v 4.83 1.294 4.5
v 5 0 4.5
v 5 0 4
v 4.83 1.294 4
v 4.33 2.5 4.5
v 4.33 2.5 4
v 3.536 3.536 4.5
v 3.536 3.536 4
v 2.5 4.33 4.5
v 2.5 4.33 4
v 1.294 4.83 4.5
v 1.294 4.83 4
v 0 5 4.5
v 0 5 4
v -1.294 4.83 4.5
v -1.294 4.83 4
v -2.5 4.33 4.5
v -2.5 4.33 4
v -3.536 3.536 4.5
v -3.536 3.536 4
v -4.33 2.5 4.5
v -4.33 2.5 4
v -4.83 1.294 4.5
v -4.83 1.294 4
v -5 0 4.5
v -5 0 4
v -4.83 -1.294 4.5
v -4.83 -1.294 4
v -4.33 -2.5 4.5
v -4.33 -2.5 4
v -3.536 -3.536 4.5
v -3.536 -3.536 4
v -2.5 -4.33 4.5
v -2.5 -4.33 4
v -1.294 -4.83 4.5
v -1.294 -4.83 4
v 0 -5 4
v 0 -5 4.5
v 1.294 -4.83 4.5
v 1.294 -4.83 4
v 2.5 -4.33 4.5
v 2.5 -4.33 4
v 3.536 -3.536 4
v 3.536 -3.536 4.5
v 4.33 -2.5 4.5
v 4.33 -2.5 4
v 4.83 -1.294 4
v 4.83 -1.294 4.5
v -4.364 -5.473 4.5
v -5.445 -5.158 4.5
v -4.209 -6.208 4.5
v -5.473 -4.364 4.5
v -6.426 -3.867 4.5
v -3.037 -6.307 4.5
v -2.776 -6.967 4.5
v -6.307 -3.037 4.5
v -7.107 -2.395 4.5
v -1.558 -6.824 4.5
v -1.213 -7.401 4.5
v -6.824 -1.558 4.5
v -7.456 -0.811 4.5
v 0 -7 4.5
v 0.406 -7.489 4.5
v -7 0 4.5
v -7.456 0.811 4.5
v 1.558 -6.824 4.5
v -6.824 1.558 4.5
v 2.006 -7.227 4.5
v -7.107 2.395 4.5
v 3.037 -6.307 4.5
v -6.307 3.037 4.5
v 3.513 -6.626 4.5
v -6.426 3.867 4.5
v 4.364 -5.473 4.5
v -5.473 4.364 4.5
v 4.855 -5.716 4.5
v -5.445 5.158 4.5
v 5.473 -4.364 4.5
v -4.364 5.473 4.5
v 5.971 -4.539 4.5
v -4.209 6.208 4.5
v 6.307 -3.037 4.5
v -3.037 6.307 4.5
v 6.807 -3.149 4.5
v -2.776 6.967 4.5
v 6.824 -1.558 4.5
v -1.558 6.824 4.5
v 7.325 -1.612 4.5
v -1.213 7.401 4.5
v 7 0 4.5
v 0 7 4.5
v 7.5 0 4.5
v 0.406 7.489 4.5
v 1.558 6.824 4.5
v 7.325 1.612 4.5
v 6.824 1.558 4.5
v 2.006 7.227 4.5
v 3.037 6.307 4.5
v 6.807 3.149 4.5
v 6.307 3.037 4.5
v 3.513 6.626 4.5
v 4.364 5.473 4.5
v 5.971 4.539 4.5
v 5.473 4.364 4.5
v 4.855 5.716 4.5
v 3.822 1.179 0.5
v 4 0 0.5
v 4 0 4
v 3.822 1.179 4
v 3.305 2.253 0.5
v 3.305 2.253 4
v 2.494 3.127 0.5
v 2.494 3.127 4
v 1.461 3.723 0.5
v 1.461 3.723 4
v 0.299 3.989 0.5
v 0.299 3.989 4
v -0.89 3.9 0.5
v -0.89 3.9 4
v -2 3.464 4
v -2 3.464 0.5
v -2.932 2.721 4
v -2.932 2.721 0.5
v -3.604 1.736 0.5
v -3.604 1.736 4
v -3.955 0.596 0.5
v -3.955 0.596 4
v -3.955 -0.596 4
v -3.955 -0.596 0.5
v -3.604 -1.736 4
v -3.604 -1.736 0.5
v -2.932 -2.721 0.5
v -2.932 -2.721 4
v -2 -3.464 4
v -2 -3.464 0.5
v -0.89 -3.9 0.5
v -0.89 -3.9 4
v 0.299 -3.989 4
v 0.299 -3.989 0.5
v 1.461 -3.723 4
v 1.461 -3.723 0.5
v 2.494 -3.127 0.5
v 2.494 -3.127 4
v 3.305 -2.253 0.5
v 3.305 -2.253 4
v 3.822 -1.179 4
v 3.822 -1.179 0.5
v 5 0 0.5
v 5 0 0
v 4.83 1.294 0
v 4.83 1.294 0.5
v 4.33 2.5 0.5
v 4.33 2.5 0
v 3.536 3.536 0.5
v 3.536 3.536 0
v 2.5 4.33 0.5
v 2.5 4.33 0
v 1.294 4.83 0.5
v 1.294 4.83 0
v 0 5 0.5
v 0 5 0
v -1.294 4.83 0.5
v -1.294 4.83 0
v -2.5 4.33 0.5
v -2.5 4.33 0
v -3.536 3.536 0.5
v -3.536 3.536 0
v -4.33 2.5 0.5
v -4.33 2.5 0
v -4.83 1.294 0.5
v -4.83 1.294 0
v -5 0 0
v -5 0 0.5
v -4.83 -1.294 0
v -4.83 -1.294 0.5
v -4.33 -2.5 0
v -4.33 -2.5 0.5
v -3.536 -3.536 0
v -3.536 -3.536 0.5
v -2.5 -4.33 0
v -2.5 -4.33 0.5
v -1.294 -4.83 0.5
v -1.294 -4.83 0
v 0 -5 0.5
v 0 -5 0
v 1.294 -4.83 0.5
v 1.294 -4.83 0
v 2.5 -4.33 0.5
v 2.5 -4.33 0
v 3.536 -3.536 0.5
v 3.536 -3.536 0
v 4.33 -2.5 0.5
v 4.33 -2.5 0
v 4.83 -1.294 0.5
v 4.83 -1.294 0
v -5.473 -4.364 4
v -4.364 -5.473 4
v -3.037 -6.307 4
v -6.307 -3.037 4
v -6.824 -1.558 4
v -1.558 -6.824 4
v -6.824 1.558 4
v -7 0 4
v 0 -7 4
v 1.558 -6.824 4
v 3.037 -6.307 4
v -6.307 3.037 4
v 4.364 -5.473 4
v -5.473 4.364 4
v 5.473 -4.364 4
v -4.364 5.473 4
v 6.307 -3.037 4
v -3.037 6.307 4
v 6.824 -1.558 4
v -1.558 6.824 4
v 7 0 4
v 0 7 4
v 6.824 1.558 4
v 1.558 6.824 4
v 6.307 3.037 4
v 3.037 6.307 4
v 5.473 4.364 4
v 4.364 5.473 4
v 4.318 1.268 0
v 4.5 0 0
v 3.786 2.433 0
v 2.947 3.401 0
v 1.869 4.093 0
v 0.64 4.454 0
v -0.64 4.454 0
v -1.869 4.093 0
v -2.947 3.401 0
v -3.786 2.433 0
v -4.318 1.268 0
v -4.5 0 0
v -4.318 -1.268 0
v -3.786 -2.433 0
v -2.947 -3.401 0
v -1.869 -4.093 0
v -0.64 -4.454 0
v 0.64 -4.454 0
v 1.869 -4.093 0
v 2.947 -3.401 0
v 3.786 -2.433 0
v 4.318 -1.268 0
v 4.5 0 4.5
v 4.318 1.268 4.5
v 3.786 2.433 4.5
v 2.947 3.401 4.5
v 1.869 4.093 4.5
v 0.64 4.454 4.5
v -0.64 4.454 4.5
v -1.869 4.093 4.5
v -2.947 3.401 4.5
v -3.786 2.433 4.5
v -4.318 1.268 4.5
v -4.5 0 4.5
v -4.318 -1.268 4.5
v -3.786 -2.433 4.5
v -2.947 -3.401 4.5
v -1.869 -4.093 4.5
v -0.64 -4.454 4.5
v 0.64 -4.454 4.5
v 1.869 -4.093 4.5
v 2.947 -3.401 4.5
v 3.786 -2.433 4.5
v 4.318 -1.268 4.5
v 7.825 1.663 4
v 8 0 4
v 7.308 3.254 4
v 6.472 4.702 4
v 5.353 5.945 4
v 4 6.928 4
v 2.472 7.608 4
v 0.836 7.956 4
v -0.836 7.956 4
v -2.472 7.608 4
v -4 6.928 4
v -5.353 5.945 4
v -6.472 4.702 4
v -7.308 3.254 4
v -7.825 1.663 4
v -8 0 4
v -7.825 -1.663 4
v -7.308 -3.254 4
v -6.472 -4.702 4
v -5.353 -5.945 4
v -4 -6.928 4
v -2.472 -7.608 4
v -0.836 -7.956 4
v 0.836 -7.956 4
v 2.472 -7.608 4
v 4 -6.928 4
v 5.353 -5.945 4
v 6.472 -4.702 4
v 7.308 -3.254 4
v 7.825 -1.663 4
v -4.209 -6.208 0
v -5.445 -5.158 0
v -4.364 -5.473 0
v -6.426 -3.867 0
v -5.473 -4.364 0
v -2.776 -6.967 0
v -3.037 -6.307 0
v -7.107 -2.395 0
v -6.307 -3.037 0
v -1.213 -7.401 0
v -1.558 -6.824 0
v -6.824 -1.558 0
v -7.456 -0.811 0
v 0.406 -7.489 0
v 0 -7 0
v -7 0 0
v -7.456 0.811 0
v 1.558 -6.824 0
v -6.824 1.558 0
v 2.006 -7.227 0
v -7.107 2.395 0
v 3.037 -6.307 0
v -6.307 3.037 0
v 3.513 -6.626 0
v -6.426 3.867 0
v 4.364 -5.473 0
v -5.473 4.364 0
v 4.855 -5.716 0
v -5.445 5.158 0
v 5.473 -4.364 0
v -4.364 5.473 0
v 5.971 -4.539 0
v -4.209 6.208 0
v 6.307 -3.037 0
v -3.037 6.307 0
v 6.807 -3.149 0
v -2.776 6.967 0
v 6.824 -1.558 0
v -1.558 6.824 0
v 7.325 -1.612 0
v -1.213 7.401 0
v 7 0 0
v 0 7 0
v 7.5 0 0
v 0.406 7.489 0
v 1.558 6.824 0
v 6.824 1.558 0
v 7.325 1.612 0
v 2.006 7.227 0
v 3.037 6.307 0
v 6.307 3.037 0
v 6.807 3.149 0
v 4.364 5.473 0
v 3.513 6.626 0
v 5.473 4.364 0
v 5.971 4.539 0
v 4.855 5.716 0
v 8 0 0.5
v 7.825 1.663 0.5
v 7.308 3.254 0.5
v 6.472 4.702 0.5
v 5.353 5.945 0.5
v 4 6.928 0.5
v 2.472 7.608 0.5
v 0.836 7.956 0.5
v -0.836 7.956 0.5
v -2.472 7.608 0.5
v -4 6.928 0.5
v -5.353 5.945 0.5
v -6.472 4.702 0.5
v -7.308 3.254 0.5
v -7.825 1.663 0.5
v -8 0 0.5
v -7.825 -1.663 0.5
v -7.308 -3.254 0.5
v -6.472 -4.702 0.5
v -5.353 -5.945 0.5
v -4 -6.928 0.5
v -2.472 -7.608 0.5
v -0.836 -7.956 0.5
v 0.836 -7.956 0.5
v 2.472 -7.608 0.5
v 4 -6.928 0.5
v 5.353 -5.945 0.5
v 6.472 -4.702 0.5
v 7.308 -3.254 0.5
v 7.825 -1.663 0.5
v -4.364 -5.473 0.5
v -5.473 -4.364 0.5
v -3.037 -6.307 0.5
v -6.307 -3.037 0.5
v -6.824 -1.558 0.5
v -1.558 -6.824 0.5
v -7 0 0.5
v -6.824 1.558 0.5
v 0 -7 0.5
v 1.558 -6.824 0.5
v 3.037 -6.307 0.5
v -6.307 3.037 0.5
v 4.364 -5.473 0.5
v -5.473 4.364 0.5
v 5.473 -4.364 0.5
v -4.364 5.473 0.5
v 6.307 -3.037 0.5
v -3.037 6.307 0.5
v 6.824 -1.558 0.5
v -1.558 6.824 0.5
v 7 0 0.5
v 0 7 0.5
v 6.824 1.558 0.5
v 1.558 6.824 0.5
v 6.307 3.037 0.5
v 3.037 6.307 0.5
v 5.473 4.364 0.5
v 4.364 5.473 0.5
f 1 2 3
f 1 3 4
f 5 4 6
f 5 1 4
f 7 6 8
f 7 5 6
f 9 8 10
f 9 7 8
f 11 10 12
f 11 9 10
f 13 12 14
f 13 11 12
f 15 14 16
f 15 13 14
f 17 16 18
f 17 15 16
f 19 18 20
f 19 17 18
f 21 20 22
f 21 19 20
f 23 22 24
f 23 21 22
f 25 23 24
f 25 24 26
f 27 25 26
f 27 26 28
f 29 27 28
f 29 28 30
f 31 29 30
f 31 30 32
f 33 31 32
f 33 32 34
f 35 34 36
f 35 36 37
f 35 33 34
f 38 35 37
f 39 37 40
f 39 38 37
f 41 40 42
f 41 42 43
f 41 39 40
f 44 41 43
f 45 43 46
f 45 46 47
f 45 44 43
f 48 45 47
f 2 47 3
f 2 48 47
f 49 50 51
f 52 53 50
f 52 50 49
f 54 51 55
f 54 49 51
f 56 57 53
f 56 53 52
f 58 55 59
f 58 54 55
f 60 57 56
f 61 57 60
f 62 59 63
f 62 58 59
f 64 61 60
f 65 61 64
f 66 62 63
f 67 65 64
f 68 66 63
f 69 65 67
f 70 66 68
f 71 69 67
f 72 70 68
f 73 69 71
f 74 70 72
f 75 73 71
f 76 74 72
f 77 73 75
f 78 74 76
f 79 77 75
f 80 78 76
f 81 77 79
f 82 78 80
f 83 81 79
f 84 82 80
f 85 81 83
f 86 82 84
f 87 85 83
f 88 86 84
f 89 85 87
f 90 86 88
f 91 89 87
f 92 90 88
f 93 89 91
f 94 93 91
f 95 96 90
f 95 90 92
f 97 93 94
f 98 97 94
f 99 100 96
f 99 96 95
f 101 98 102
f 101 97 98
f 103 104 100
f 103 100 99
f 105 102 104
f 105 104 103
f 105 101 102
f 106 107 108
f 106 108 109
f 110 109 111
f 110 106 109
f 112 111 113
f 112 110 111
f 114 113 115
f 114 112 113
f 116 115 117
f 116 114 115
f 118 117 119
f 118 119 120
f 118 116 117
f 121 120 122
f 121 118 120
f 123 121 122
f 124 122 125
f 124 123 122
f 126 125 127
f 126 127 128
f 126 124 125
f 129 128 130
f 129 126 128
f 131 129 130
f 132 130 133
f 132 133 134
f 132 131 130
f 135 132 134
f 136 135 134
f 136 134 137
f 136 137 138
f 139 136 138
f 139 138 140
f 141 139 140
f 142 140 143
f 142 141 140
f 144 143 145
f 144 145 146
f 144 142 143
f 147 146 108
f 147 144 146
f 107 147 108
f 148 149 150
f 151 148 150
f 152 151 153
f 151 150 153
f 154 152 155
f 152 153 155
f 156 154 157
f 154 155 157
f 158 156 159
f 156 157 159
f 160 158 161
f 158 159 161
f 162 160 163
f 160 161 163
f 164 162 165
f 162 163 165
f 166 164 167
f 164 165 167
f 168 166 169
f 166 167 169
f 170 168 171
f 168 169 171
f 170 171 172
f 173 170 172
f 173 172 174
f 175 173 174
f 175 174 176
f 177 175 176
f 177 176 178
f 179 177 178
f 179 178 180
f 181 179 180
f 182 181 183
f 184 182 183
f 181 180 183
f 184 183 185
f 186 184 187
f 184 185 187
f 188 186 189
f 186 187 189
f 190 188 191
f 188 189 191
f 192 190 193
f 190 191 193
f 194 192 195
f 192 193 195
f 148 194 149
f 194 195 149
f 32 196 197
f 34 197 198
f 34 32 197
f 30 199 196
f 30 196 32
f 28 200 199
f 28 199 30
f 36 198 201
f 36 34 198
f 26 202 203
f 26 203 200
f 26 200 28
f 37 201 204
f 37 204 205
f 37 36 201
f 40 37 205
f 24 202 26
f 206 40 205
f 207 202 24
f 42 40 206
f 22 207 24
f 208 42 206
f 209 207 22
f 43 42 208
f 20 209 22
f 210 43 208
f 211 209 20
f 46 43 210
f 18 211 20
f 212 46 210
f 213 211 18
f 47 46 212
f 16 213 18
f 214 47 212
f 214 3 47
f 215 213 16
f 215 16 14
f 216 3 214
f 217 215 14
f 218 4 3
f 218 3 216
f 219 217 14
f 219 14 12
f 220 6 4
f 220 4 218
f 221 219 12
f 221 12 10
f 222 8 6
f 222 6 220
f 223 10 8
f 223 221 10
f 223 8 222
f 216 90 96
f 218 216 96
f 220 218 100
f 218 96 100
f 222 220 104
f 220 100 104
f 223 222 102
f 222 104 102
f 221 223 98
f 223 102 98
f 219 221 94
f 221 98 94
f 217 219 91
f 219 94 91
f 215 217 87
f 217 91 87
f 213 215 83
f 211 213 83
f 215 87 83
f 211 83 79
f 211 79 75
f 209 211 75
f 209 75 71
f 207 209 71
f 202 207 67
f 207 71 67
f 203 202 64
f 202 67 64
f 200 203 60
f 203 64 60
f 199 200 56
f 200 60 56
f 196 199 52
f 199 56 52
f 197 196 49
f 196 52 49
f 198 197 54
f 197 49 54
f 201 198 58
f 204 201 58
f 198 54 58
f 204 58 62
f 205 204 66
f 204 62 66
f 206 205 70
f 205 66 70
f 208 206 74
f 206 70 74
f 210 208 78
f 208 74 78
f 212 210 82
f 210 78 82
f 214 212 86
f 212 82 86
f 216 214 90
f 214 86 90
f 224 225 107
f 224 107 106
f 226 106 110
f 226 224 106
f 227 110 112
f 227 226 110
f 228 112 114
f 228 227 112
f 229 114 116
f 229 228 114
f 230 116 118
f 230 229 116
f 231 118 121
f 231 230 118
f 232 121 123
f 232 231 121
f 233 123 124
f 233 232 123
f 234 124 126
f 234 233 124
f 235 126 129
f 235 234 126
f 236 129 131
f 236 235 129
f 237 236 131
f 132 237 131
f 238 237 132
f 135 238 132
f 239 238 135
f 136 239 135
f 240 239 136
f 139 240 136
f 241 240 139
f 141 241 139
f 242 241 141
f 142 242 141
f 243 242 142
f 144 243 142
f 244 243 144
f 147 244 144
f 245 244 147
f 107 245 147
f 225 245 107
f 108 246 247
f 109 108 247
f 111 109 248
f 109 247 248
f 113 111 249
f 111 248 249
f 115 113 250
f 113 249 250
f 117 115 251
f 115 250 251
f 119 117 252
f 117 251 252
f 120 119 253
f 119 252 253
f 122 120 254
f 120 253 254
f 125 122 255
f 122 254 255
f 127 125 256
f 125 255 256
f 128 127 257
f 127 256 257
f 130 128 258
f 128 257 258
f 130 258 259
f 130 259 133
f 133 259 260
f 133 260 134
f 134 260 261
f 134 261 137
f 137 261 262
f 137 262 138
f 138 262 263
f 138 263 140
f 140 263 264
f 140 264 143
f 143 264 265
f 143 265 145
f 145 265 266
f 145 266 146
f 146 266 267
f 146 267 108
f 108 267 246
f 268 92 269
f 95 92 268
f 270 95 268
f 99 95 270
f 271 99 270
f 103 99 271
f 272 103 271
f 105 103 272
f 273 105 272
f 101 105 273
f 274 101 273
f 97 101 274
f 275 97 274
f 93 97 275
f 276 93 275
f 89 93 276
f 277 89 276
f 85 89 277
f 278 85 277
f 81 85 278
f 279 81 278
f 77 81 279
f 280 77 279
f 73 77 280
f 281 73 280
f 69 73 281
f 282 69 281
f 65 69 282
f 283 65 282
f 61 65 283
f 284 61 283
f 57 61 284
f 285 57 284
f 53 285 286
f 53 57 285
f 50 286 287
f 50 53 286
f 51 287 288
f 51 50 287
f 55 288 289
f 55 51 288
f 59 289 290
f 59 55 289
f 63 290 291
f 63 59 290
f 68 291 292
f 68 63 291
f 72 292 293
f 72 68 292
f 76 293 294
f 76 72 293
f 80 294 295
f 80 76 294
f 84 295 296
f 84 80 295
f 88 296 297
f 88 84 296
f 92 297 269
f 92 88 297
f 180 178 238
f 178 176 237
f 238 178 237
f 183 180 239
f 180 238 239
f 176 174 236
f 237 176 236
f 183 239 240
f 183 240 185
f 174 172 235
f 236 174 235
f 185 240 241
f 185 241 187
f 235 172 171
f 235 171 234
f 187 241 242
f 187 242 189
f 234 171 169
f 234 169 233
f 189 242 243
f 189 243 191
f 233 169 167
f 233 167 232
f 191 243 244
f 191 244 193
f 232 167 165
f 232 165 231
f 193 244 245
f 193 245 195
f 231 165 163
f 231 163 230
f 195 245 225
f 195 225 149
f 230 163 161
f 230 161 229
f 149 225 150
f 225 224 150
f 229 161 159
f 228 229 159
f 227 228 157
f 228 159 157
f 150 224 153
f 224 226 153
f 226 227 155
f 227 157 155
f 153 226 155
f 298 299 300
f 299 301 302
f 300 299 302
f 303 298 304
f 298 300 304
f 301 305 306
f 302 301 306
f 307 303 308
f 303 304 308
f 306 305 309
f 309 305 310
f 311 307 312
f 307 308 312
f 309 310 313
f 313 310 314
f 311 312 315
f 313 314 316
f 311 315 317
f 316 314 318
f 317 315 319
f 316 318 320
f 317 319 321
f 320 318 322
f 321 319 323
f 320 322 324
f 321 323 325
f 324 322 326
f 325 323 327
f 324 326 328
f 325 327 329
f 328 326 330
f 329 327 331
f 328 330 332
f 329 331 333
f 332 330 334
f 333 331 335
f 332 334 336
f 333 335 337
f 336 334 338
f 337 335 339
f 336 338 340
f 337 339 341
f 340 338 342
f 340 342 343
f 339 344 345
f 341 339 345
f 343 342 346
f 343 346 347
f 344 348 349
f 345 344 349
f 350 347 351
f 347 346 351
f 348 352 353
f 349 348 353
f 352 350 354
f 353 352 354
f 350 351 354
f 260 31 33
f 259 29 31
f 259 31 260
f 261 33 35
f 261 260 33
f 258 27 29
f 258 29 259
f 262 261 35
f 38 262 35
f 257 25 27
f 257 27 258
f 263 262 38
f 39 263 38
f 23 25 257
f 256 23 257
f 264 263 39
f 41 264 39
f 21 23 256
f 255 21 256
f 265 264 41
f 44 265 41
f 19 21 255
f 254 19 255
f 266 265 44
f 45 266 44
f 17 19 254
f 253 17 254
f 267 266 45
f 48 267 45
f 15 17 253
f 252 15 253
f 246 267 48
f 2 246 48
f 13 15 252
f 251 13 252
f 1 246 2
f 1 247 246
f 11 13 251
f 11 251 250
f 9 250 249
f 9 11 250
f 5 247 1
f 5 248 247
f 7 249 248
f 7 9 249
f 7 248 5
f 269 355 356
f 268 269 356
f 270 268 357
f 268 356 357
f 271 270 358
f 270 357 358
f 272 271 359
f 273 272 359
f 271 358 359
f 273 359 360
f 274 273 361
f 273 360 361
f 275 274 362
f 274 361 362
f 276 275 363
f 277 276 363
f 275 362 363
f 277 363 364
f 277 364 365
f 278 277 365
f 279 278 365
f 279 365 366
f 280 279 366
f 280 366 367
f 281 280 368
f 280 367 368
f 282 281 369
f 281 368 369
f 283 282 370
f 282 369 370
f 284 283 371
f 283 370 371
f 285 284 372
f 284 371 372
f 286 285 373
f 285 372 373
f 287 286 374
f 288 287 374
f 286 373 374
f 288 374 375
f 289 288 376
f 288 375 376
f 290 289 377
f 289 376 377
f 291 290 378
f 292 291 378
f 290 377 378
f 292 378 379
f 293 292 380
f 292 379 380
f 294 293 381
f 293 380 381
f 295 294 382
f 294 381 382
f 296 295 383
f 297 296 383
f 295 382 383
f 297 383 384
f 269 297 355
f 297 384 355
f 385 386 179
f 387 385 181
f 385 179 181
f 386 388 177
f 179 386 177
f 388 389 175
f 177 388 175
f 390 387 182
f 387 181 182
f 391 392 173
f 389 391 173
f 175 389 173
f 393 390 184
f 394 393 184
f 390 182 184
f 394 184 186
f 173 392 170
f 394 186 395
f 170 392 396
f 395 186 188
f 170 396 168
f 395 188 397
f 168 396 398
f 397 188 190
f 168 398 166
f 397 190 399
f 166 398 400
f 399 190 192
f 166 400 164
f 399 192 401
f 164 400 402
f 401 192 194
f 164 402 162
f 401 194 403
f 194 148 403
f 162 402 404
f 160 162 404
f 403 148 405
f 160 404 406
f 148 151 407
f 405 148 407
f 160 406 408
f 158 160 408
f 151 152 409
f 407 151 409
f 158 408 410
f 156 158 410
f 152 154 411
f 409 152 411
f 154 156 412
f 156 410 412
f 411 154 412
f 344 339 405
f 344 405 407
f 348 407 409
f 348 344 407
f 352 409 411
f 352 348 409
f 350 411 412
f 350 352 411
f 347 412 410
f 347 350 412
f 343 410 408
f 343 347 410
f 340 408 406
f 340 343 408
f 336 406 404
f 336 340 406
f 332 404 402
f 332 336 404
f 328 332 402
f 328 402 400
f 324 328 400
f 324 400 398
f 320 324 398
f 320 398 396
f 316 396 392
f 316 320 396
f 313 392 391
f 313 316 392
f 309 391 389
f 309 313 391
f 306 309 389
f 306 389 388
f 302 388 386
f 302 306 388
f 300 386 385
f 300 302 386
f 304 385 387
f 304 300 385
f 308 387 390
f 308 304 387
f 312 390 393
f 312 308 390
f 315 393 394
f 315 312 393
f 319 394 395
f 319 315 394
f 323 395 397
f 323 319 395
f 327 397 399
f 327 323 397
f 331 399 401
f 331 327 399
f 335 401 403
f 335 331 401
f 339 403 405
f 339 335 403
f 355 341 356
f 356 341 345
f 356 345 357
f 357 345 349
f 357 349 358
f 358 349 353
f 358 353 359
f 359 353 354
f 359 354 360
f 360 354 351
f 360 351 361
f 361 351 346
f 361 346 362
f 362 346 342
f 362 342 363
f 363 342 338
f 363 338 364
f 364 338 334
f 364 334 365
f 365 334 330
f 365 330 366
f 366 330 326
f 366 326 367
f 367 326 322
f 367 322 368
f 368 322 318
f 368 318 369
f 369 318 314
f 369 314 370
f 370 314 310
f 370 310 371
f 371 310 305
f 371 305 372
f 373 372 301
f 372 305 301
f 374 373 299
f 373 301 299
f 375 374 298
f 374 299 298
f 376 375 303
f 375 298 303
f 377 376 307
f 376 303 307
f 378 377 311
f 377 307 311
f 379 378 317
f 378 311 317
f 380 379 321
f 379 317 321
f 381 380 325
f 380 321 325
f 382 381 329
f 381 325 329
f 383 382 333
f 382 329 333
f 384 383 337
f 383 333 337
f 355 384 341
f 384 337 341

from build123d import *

# Parameters (mm, degrees)
SKETCH1_R           = 8
SKETCH1_R_2         = 4
BOSS_EXTRUDE1_DEPTH = 4.5
CHAMFER1_SIZE       = 0.5
SKETCH2_R           = 7
SKETCH2_R_2         = 5
CUT_EXTRUDE1_DEPTH  = 0.5
SKETCH3_R           = 7
SKETCH3_R_2         = 5
CUT_EXTRUDE2_DEPTH  = 0.5


with BuildPart() as part:
    # Sketch1 → Boss-Extrude1 (new body)
    with BuildSketch(Plane.XY):
        Circle(SKETCH1_R)
        Circle(SKETCH1_R_2, mode=Mode.SUBTRACT)
    extrude(amount=BOSS_EXTRUDE1_DEPTH)

    # Chamfer1
    chamfer1_edges = [part.edges().sort_by_distance(p)[0] for p in [
        (-8, 0, 0),
        (-8, 0, 4.5),
        (-4, 0, 0),
        (-4, 0, 4.5),
    ]]
    chamfer(chamfer1_edges, length=CHAMFER1_SIZE)

    # Sketch2 → Cut-Extrude1 (cut)
    with BuildSketch(Plane.XY):
        Circle(SKETCH2_R)
        Circle(SKETCH2_R_2, mode=Mode.SUBTRACT)
    extrude(amount=CUT_EXTRUDE1_DEPTH, mode=Mode.SUBTRACT)

    # Sketch3 → Cut-Extrude2 (cut)
    with BuildSketch(Plane.XY.offset(4.5)):
        Circle(SKETCH3_R)
        Circle(SKETCH3_R_2, mode=Mode.SUBTRACT)
    extrude(amount=-CUT_EXTRUDE2_DEPTH, mode=Mode.SUBTRACT)


solid = part.part
